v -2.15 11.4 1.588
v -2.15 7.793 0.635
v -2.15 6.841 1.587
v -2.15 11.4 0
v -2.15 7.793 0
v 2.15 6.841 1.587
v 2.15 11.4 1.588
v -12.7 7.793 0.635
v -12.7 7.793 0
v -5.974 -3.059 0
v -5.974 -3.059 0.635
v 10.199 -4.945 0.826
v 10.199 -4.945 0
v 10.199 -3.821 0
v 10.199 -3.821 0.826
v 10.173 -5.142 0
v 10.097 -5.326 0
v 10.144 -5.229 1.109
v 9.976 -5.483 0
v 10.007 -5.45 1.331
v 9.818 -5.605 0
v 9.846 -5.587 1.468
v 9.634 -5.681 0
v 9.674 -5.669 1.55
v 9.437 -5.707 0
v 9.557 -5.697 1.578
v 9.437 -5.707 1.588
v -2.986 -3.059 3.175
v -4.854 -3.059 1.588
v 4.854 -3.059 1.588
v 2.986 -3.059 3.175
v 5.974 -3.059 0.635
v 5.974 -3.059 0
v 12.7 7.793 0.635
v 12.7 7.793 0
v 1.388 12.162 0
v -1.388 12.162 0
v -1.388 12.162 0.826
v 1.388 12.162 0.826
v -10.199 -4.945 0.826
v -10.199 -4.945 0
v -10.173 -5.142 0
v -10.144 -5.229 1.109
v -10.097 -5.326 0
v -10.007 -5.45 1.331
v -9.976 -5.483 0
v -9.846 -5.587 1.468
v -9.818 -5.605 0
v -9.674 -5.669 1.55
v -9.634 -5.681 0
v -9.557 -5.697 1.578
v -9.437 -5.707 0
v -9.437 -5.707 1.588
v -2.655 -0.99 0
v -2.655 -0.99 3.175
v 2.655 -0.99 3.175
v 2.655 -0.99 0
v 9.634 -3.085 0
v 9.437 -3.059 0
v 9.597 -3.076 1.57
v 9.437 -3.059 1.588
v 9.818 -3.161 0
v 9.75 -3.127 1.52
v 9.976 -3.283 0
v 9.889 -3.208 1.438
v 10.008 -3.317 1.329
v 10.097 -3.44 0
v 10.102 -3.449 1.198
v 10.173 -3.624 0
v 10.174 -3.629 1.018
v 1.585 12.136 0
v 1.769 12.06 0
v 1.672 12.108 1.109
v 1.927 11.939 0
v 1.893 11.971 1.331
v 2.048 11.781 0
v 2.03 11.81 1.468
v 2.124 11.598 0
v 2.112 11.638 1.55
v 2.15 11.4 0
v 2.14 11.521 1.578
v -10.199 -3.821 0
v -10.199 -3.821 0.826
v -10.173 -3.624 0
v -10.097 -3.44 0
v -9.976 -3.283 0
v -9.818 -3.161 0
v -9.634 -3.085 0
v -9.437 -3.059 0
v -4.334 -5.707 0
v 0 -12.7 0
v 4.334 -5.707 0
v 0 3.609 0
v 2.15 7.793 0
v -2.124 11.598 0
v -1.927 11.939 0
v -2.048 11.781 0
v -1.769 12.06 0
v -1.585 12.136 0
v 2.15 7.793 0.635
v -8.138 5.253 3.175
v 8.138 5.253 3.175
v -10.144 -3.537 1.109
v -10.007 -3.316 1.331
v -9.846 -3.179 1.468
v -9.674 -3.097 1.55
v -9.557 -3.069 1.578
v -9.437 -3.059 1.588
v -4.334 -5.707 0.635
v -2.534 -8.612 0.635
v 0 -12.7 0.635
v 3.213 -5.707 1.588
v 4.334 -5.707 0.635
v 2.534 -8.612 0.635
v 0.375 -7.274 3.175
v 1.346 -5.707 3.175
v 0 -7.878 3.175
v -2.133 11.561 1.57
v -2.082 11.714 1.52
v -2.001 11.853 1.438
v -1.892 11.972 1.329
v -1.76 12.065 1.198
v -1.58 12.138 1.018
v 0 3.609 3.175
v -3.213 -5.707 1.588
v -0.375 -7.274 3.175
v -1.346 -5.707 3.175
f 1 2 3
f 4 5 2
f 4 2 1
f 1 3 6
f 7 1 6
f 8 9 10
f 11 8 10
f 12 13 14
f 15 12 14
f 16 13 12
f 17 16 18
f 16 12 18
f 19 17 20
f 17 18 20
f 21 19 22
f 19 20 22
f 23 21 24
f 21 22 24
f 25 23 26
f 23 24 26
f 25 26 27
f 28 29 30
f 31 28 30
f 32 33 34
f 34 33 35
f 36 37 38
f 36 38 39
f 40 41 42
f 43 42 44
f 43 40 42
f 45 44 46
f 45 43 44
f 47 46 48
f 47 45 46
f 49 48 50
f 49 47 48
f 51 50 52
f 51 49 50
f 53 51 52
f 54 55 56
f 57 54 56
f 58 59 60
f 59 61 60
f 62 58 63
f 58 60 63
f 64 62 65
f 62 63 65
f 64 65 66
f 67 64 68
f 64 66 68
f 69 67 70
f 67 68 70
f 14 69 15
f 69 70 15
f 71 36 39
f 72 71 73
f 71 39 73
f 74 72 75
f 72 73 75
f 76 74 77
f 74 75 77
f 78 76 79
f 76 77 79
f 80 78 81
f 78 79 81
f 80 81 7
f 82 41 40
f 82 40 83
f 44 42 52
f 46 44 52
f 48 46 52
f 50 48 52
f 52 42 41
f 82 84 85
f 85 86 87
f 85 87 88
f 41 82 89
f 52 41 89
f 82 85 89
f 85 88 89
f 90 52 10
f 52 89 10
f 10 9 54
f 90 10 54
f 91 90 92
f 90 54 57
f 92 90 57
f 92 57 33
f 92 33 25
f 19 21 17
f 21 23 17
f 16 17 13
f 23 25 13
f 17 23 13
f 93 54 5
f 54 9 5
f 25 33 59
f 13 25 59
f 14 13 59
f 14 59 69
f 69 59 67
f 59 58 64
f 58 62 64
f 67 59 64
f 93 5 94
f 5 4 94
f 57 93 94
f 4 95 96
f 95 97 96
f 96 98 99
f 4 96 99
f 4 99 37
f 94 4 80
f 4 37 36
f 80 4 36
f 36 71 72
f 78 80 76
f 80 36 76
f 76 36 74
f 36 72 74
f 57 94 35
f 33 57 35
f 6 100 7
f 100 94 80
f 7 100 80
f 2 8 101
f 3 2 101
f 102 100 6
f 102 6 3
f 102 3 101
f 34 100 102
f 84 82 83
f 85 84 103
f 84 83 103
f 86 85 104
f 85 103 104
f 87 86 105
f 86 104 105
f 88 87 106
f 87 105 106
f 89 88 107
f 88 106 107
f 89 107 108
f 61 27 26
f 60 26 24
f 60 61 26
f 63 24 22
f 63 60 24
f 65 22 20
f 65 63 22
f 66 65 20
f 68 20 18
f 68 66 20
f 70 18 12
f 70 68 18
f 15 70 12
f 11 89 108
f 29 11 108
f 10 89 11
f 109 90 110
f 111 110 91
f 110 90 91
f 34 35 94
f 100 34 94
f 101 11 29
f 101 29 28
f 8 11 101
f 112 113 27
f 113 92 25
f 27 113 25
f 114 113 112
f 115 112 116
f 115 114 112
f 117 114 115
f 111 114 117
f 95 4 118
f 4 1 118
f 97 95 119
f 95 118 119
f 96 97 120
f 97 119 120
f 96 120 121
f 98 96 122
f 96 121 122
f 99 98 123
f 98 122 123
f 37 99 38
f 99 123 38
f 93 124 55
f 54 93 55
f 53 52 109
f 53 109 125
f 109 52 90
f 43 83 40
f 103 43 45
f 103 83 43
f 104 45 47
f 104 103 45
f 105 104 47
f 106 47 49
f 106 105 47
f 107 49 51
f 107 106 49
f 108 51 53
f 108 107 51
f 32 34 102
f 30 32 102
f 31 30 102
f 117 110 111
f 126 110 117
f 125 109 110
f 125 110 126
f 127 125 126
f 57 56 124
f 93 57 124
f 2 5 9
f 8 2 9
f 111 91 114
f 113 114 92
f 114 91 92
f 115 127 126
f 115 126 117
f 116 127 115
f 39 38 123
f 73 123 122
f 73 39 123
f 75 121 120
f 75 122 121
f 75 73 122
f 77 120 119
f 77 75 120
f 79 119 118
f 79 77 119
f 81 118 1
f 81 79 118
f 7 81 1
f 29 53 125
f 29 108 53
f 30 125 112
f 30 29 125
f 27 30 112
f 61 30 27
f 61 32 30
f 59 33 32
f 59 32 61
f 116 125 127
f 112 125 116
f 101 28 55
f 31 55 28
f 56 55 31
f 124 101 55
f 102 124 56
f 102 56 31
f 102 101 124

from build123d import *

# Parameters (mm, degrees)
F1_DEPTH     = 3.175
F2_W         = 20.397445187
F2_H         = 2.647349927
F2_W_2       = 4.2995549738
F2_H_2       = 13.8314400401
F3_DEPTH     = 1.5875
F4_W         = 14.3783436368
F4_H         = 2.647349927
F5_DEPTH     = 25.4
F6_T4_DEPTH  = 25.8319450188
F6_T9_DEPTH  = 25.8319450188
F6_T14_DEPTH = 38.4641495789
F6_T19_DEPTH = 38.4641495789
F6_T24_DEPTH = 38.4641495789
F6_T29_DEPTH = 25.8319450188
F6_T34_DEPTH = 25.8319450188
F6_T39_DEPTH = 21.2914590052
F6_T44_DEPTH = 21.2914590052
F6_T49_DEPTH = 21.2914590052
F6_T54_DEPTH = 21.2914590052
F7_R         = 0.762
F9_DEPTH     = 25.4


# Not quite as in the source:
# - a fillet or chamfer that OpenCascade refuses, or shapes differently, is made with other operations: its cross-section is extruded or revolved along the edge and cut away or added


with BuildPart() as f1:
    # F0 (on Top) → F1 (new body)
    with BuildSketch(Plane.XY):
        Polygon((12.7, 7.7934656292), (-12.7, 7.7934656292), (0, -12.7), align=None)
    extrude(amount=F1_DEPTH)

    # F2 (on Top) → F3 (join)
    with BuildSketch(Plane.XY):
        with Locations((0, -4.3830036468)):
            Rectangle(F2_W, F2_H)
        with Locations((0, 5.2467339706)):
            Rectangle(F2_W_2, F2_H_2)
    extrude(amount=F3_DEPTH)

    # F4 (on face) → F5 (cut)
    with BuildSketch(Plane.XY.offset(1.5875)):
        with Locations((-1.2147540241, -4.3830036468)):
            Rectangle(F4_W, F4_H)
    extrude(amount=F5_DEPTH, mode=Mode.SUBTRACT)

    # F6: chamfer of 2.54 on 5 edges, made by hand


with BuildPart() as f6_tool2:
    # F6_s3 → F6_t4 (new body)
    with BuildSketch(Plane(origin=(-10.454367288, 16.8697808418, 0), x_dir=(0, 0, 1), z_dir=(0.5267614317, -0.8500131729, 0))):
        Polygon((0.635, 6.6898701827), (3.175, 4.1498701827), (3.175, 6.6898701827), align=None)
    extrude(amount=F6_T4_DEPTH)

    split(bisect_by=Plane.XZ.offset(3.0593286833), keep=Keep.BOTTOM)


with BuildPart() as f1_1:
    add(f1.part)

    # F6_t1: cut F6_tool2
    add(f6_tool2.part, mode=Mode.SUBTRACT)


with BuildPart() as f6_tool7:
    # F6_s8 → F6_t9 (new body)
    with BuildSketch(Plane(origin=(-10.454367288, 16.8697808418, 0), x_dir=(0, 0, 1), z_dir=(0.5267614317, -0.8500131729, 0))):
        Polygon((0.635, 6.6898701827), (3.175, 4.1498701827), (3.175, 6.6898701827), align=None)
    extrude(amount=F6_T9_DEPTH)

    split(bisect_by=Plane.XZ.offset(5.7066786103), keep=Keep.TOP)


with BuildPart() as f1_2:
    add(f1_1.part)

    # F6_t6: cut F6_tool7
    add(f6_tool7.part, mode=Mode.SUBTRACT)


with BuildPart() as f6_tool12:
    # F6_s13 → F6_t14 (new body)
    with BuildSketch(Plane.YZ.offset(19.2320747894)):
        Polygon((7.7934656292, 0.635), (5.2534656292, 3.175), (7.7934656292, 3.175), align=None)
    extrude(amount=-F6_T14_DEPTH)

    split(bisect_by=Plane.YZ.offset(2.1497774869), keep=Keep.TOP)


with BuildPart() as f1_3:
    add(f1_2.part)

    # F6_t11: cut F6_tool12
    add(f6_tool12.part, mode=Mode.SUBTRACT)


with BuildPart() as f6_tool17:
    # F6_s18 → F6_t19 (new body)
    with BuildSketch(Plane.YZ.offset(19.2320747894)):
        Polygon((7.7934656292, 0.635), (5.2534656292, 3.175), (7.7934656292, 3.175), align=None)
    extrude(amount=-F6_T19_DEPTH)

    split(bisect_by=Plane.XY.offset(1.5875), keep=Keep.TOP)


with BuildPart() as f1_4:
    add(f1_3.part)

    # F6_t16: cut F6_tool17
    add(f6_tool17.part, mode=Mode.SUBTRACT)


with BuildPart() as f6_tool22:
    # F6_s23 → F6_t24 (new body)
    with BuildSketch(Plane.YZ.offset(19.2320747894)):
        Polygon((7.7934656292, 0.635), (5.2534656292, 3.175), (7.7934656292, 3.175), align=None)
    extrude(amount=-F6_T24_DEPTH)

    split(bisect_by=Plane.YZ.offset(-2.1497774869), keep=Keep.BOTTOM)


with BuildPart() as f1_5:
    add(f1_4.part)

    # F6_t21: cut F6_tool22
    add(f6_tool22.part, mode=Mode.SUBTRACT)


with BuildPart() as f6_tool27:
    # F6_s28 → F6_t29 (new body)
    with BuildSketch(Plane(origin=(-3.1529050539, -5.0877127051, 0), x_dir=(0, 0, 1), z_dir=(0.5267614317, 0.8500131729, 0))):
        Polygon((0.635, 6.6898701827), (3.175, 4.1498701827), (3.175, 6.6898701827), align=None)
    extrude(amount=F6_T29_DEPTH)

    split(bisect_by=Plane.XZ.offset(5.7066786103), keep=Keep.TOP)


with BuildPart() as f1_6:
    add(f1_5.part)

    # F6_t26: cut F6_tool27
    add(f6_tool27.part, mode=Mode.SUBTRACT)


with BuildPart() as f6_tool32:
    # F6_s33 → F6_t34 (new body)
    with BuildSketch(Plane(origin=(-3.1529050539, -5.0877127051, 0), x_dir=(0, 0, 1), z_dir=(0.5267614317, 0.8500131729, 0))):
        Polygon((0.635, 6.6898701827), (3.175, 4.1498701827), (3.175, 6.6898701827), align=None)
    extrude(amount=F6_T34_DEPTH)

    split(bisect_by=Plane.XZ.offset(3.0593286833), keep=Keep.BOTTOM)


with BuildPart() as f1_7:
    add(f1_6.part)

    # F6_t31: cut F6_tool32
    add(f6_tool32.part, mode=Mode.SUBTRACT)


with BuildPart() as f6_tool37:
    # F6_s38 → F6_t39 (new body)
    with BuildSketch(Plane(origin=(-9.1273228482, -14.7283840218, 0), x_dir=(0, 0, 1), z_dir=(0.5267614317, 0.8500131729, 0))):
        Polygon((0.635, 6.6898701827), (3.175, 4.1498701827), (3.175, 6.6898701827), align=None)
    extrude(amount=F6_T39_DEPTH)

    split(bisect_by=Plane.XZ.offset(5.7066786103), keep=Keep.TOP)


with BuildPart() as f1_8:
    add(f1_7.part)

    # F6_t36: cut F6_tool37
    add(f6_tool37.part, mode=Mode.SUBTRACT)


with BuildPart() as f6_tool42:
    # F6_s43 → F6_t44 (new body)
    with BuildSketch(Plane(origin=(-9.1273228482, -14.7283840218, 0), x_dir=(0, 0, 1), z_dir=(0.5267614317, 0.8500131729, 0))):
        Polygon((0.635, 6.6898701827), (3.175, 4.1498701827), (3.175, 6.6898701827), align=None)
    extrude(amount=F6_T44_DEPTH)

    split(bisect_by=Plane.XZ.offset(3.0593286833), keep=Keep.BOTTOM)


with BuildPart() as f1_9:
    add(f1_8.part)

    # F6_t41: cut F6_tool42
    add(f6_tool42.part, mode=Mode.SUBTRACT)


with BuildPart() as f6_tool47:
    # F6_s48 → F6_t49 (new body)
    with BuildSketch(Plane(origin=(-2.0881965805, 3.3696366023, 0), x_dir=(0, 0, 1), z_dir=(0.5267614317, -0.8500131729, 0))):
        Polygon((0.635, 6.6898701827), (3.175, 4.1498701827), (3.175, 6.6898701827), align=None)
    extrude(amount=F6_T49_DEPTH)

    split(bisect_by=Plane.XZ.offset(3.0593286833), keep=Keep.BOTTOM)


with BuildPart() as f1_10:
    add(f1_9.part)

    # F6_t46: cut F6_tool47
    add(f6_tool47.part, mode=Mode.SUBTRACT)


with BuildPart() as f6_tool52:
    # F6_s53 → F6_t54 (new body)
    with BuildSketch(Plane(origin=(-2.0881965805, 3.3696366023, 0), x_dir=(0, 0, 1), z_dir=(0.5267614317, -0.8500131729, 0))):
        Polygon((0.635, 6.6898701827), (3.175, 4.1498701827), (3.175, 6.6898701827), align=None)
    extrude(amount=F6_T54_DEPTH)

    split(bisect_by=Plane.XZ.offset(5.7066786103), keep=Keep.TOP)


with BuildPart() as f1_11:
    add(f1_10.part)

    # F6_t51: cut F6_tool52
    add(f6_tool52.part, mode=Mode.SUBTRACT)

    # F7
    f7_edges = [f1_11.edges().sort_by_distance(p)[0] for p in [
        (-2.149777, 12.162454, 0.79375),
        (0, 12.162454, 1.5875),
        (2.149777, 12.162454, 0.79375),
        (-10.198723, -4.383004, 1.5875),
        (-10.198723, -5.706679, 0.79375),
        (-10.198723, -3.059329, 0.79375),
        (10.198723, -3.059329, 0.79375),
        (10.198723, -5.706679, 0.79375),
        (10.198723, -4.383004, 1.5875),
    ]]
    fillet(f7_edges, radius=F7_R)

    # F8 (on face) → F9 (cut)
    with BuildSketch(Plane.XY.offset(3.175)):
        Polygon((-2.6549665111, -0.989894278), (0, -0.989894278), (2.6549665111, -0.989894278), (0, 3.6086426117), align=None)
    extrude(amount=-F9_DEPTH, mode=Mode.SUBTRACT)


solid = f1_11.part
